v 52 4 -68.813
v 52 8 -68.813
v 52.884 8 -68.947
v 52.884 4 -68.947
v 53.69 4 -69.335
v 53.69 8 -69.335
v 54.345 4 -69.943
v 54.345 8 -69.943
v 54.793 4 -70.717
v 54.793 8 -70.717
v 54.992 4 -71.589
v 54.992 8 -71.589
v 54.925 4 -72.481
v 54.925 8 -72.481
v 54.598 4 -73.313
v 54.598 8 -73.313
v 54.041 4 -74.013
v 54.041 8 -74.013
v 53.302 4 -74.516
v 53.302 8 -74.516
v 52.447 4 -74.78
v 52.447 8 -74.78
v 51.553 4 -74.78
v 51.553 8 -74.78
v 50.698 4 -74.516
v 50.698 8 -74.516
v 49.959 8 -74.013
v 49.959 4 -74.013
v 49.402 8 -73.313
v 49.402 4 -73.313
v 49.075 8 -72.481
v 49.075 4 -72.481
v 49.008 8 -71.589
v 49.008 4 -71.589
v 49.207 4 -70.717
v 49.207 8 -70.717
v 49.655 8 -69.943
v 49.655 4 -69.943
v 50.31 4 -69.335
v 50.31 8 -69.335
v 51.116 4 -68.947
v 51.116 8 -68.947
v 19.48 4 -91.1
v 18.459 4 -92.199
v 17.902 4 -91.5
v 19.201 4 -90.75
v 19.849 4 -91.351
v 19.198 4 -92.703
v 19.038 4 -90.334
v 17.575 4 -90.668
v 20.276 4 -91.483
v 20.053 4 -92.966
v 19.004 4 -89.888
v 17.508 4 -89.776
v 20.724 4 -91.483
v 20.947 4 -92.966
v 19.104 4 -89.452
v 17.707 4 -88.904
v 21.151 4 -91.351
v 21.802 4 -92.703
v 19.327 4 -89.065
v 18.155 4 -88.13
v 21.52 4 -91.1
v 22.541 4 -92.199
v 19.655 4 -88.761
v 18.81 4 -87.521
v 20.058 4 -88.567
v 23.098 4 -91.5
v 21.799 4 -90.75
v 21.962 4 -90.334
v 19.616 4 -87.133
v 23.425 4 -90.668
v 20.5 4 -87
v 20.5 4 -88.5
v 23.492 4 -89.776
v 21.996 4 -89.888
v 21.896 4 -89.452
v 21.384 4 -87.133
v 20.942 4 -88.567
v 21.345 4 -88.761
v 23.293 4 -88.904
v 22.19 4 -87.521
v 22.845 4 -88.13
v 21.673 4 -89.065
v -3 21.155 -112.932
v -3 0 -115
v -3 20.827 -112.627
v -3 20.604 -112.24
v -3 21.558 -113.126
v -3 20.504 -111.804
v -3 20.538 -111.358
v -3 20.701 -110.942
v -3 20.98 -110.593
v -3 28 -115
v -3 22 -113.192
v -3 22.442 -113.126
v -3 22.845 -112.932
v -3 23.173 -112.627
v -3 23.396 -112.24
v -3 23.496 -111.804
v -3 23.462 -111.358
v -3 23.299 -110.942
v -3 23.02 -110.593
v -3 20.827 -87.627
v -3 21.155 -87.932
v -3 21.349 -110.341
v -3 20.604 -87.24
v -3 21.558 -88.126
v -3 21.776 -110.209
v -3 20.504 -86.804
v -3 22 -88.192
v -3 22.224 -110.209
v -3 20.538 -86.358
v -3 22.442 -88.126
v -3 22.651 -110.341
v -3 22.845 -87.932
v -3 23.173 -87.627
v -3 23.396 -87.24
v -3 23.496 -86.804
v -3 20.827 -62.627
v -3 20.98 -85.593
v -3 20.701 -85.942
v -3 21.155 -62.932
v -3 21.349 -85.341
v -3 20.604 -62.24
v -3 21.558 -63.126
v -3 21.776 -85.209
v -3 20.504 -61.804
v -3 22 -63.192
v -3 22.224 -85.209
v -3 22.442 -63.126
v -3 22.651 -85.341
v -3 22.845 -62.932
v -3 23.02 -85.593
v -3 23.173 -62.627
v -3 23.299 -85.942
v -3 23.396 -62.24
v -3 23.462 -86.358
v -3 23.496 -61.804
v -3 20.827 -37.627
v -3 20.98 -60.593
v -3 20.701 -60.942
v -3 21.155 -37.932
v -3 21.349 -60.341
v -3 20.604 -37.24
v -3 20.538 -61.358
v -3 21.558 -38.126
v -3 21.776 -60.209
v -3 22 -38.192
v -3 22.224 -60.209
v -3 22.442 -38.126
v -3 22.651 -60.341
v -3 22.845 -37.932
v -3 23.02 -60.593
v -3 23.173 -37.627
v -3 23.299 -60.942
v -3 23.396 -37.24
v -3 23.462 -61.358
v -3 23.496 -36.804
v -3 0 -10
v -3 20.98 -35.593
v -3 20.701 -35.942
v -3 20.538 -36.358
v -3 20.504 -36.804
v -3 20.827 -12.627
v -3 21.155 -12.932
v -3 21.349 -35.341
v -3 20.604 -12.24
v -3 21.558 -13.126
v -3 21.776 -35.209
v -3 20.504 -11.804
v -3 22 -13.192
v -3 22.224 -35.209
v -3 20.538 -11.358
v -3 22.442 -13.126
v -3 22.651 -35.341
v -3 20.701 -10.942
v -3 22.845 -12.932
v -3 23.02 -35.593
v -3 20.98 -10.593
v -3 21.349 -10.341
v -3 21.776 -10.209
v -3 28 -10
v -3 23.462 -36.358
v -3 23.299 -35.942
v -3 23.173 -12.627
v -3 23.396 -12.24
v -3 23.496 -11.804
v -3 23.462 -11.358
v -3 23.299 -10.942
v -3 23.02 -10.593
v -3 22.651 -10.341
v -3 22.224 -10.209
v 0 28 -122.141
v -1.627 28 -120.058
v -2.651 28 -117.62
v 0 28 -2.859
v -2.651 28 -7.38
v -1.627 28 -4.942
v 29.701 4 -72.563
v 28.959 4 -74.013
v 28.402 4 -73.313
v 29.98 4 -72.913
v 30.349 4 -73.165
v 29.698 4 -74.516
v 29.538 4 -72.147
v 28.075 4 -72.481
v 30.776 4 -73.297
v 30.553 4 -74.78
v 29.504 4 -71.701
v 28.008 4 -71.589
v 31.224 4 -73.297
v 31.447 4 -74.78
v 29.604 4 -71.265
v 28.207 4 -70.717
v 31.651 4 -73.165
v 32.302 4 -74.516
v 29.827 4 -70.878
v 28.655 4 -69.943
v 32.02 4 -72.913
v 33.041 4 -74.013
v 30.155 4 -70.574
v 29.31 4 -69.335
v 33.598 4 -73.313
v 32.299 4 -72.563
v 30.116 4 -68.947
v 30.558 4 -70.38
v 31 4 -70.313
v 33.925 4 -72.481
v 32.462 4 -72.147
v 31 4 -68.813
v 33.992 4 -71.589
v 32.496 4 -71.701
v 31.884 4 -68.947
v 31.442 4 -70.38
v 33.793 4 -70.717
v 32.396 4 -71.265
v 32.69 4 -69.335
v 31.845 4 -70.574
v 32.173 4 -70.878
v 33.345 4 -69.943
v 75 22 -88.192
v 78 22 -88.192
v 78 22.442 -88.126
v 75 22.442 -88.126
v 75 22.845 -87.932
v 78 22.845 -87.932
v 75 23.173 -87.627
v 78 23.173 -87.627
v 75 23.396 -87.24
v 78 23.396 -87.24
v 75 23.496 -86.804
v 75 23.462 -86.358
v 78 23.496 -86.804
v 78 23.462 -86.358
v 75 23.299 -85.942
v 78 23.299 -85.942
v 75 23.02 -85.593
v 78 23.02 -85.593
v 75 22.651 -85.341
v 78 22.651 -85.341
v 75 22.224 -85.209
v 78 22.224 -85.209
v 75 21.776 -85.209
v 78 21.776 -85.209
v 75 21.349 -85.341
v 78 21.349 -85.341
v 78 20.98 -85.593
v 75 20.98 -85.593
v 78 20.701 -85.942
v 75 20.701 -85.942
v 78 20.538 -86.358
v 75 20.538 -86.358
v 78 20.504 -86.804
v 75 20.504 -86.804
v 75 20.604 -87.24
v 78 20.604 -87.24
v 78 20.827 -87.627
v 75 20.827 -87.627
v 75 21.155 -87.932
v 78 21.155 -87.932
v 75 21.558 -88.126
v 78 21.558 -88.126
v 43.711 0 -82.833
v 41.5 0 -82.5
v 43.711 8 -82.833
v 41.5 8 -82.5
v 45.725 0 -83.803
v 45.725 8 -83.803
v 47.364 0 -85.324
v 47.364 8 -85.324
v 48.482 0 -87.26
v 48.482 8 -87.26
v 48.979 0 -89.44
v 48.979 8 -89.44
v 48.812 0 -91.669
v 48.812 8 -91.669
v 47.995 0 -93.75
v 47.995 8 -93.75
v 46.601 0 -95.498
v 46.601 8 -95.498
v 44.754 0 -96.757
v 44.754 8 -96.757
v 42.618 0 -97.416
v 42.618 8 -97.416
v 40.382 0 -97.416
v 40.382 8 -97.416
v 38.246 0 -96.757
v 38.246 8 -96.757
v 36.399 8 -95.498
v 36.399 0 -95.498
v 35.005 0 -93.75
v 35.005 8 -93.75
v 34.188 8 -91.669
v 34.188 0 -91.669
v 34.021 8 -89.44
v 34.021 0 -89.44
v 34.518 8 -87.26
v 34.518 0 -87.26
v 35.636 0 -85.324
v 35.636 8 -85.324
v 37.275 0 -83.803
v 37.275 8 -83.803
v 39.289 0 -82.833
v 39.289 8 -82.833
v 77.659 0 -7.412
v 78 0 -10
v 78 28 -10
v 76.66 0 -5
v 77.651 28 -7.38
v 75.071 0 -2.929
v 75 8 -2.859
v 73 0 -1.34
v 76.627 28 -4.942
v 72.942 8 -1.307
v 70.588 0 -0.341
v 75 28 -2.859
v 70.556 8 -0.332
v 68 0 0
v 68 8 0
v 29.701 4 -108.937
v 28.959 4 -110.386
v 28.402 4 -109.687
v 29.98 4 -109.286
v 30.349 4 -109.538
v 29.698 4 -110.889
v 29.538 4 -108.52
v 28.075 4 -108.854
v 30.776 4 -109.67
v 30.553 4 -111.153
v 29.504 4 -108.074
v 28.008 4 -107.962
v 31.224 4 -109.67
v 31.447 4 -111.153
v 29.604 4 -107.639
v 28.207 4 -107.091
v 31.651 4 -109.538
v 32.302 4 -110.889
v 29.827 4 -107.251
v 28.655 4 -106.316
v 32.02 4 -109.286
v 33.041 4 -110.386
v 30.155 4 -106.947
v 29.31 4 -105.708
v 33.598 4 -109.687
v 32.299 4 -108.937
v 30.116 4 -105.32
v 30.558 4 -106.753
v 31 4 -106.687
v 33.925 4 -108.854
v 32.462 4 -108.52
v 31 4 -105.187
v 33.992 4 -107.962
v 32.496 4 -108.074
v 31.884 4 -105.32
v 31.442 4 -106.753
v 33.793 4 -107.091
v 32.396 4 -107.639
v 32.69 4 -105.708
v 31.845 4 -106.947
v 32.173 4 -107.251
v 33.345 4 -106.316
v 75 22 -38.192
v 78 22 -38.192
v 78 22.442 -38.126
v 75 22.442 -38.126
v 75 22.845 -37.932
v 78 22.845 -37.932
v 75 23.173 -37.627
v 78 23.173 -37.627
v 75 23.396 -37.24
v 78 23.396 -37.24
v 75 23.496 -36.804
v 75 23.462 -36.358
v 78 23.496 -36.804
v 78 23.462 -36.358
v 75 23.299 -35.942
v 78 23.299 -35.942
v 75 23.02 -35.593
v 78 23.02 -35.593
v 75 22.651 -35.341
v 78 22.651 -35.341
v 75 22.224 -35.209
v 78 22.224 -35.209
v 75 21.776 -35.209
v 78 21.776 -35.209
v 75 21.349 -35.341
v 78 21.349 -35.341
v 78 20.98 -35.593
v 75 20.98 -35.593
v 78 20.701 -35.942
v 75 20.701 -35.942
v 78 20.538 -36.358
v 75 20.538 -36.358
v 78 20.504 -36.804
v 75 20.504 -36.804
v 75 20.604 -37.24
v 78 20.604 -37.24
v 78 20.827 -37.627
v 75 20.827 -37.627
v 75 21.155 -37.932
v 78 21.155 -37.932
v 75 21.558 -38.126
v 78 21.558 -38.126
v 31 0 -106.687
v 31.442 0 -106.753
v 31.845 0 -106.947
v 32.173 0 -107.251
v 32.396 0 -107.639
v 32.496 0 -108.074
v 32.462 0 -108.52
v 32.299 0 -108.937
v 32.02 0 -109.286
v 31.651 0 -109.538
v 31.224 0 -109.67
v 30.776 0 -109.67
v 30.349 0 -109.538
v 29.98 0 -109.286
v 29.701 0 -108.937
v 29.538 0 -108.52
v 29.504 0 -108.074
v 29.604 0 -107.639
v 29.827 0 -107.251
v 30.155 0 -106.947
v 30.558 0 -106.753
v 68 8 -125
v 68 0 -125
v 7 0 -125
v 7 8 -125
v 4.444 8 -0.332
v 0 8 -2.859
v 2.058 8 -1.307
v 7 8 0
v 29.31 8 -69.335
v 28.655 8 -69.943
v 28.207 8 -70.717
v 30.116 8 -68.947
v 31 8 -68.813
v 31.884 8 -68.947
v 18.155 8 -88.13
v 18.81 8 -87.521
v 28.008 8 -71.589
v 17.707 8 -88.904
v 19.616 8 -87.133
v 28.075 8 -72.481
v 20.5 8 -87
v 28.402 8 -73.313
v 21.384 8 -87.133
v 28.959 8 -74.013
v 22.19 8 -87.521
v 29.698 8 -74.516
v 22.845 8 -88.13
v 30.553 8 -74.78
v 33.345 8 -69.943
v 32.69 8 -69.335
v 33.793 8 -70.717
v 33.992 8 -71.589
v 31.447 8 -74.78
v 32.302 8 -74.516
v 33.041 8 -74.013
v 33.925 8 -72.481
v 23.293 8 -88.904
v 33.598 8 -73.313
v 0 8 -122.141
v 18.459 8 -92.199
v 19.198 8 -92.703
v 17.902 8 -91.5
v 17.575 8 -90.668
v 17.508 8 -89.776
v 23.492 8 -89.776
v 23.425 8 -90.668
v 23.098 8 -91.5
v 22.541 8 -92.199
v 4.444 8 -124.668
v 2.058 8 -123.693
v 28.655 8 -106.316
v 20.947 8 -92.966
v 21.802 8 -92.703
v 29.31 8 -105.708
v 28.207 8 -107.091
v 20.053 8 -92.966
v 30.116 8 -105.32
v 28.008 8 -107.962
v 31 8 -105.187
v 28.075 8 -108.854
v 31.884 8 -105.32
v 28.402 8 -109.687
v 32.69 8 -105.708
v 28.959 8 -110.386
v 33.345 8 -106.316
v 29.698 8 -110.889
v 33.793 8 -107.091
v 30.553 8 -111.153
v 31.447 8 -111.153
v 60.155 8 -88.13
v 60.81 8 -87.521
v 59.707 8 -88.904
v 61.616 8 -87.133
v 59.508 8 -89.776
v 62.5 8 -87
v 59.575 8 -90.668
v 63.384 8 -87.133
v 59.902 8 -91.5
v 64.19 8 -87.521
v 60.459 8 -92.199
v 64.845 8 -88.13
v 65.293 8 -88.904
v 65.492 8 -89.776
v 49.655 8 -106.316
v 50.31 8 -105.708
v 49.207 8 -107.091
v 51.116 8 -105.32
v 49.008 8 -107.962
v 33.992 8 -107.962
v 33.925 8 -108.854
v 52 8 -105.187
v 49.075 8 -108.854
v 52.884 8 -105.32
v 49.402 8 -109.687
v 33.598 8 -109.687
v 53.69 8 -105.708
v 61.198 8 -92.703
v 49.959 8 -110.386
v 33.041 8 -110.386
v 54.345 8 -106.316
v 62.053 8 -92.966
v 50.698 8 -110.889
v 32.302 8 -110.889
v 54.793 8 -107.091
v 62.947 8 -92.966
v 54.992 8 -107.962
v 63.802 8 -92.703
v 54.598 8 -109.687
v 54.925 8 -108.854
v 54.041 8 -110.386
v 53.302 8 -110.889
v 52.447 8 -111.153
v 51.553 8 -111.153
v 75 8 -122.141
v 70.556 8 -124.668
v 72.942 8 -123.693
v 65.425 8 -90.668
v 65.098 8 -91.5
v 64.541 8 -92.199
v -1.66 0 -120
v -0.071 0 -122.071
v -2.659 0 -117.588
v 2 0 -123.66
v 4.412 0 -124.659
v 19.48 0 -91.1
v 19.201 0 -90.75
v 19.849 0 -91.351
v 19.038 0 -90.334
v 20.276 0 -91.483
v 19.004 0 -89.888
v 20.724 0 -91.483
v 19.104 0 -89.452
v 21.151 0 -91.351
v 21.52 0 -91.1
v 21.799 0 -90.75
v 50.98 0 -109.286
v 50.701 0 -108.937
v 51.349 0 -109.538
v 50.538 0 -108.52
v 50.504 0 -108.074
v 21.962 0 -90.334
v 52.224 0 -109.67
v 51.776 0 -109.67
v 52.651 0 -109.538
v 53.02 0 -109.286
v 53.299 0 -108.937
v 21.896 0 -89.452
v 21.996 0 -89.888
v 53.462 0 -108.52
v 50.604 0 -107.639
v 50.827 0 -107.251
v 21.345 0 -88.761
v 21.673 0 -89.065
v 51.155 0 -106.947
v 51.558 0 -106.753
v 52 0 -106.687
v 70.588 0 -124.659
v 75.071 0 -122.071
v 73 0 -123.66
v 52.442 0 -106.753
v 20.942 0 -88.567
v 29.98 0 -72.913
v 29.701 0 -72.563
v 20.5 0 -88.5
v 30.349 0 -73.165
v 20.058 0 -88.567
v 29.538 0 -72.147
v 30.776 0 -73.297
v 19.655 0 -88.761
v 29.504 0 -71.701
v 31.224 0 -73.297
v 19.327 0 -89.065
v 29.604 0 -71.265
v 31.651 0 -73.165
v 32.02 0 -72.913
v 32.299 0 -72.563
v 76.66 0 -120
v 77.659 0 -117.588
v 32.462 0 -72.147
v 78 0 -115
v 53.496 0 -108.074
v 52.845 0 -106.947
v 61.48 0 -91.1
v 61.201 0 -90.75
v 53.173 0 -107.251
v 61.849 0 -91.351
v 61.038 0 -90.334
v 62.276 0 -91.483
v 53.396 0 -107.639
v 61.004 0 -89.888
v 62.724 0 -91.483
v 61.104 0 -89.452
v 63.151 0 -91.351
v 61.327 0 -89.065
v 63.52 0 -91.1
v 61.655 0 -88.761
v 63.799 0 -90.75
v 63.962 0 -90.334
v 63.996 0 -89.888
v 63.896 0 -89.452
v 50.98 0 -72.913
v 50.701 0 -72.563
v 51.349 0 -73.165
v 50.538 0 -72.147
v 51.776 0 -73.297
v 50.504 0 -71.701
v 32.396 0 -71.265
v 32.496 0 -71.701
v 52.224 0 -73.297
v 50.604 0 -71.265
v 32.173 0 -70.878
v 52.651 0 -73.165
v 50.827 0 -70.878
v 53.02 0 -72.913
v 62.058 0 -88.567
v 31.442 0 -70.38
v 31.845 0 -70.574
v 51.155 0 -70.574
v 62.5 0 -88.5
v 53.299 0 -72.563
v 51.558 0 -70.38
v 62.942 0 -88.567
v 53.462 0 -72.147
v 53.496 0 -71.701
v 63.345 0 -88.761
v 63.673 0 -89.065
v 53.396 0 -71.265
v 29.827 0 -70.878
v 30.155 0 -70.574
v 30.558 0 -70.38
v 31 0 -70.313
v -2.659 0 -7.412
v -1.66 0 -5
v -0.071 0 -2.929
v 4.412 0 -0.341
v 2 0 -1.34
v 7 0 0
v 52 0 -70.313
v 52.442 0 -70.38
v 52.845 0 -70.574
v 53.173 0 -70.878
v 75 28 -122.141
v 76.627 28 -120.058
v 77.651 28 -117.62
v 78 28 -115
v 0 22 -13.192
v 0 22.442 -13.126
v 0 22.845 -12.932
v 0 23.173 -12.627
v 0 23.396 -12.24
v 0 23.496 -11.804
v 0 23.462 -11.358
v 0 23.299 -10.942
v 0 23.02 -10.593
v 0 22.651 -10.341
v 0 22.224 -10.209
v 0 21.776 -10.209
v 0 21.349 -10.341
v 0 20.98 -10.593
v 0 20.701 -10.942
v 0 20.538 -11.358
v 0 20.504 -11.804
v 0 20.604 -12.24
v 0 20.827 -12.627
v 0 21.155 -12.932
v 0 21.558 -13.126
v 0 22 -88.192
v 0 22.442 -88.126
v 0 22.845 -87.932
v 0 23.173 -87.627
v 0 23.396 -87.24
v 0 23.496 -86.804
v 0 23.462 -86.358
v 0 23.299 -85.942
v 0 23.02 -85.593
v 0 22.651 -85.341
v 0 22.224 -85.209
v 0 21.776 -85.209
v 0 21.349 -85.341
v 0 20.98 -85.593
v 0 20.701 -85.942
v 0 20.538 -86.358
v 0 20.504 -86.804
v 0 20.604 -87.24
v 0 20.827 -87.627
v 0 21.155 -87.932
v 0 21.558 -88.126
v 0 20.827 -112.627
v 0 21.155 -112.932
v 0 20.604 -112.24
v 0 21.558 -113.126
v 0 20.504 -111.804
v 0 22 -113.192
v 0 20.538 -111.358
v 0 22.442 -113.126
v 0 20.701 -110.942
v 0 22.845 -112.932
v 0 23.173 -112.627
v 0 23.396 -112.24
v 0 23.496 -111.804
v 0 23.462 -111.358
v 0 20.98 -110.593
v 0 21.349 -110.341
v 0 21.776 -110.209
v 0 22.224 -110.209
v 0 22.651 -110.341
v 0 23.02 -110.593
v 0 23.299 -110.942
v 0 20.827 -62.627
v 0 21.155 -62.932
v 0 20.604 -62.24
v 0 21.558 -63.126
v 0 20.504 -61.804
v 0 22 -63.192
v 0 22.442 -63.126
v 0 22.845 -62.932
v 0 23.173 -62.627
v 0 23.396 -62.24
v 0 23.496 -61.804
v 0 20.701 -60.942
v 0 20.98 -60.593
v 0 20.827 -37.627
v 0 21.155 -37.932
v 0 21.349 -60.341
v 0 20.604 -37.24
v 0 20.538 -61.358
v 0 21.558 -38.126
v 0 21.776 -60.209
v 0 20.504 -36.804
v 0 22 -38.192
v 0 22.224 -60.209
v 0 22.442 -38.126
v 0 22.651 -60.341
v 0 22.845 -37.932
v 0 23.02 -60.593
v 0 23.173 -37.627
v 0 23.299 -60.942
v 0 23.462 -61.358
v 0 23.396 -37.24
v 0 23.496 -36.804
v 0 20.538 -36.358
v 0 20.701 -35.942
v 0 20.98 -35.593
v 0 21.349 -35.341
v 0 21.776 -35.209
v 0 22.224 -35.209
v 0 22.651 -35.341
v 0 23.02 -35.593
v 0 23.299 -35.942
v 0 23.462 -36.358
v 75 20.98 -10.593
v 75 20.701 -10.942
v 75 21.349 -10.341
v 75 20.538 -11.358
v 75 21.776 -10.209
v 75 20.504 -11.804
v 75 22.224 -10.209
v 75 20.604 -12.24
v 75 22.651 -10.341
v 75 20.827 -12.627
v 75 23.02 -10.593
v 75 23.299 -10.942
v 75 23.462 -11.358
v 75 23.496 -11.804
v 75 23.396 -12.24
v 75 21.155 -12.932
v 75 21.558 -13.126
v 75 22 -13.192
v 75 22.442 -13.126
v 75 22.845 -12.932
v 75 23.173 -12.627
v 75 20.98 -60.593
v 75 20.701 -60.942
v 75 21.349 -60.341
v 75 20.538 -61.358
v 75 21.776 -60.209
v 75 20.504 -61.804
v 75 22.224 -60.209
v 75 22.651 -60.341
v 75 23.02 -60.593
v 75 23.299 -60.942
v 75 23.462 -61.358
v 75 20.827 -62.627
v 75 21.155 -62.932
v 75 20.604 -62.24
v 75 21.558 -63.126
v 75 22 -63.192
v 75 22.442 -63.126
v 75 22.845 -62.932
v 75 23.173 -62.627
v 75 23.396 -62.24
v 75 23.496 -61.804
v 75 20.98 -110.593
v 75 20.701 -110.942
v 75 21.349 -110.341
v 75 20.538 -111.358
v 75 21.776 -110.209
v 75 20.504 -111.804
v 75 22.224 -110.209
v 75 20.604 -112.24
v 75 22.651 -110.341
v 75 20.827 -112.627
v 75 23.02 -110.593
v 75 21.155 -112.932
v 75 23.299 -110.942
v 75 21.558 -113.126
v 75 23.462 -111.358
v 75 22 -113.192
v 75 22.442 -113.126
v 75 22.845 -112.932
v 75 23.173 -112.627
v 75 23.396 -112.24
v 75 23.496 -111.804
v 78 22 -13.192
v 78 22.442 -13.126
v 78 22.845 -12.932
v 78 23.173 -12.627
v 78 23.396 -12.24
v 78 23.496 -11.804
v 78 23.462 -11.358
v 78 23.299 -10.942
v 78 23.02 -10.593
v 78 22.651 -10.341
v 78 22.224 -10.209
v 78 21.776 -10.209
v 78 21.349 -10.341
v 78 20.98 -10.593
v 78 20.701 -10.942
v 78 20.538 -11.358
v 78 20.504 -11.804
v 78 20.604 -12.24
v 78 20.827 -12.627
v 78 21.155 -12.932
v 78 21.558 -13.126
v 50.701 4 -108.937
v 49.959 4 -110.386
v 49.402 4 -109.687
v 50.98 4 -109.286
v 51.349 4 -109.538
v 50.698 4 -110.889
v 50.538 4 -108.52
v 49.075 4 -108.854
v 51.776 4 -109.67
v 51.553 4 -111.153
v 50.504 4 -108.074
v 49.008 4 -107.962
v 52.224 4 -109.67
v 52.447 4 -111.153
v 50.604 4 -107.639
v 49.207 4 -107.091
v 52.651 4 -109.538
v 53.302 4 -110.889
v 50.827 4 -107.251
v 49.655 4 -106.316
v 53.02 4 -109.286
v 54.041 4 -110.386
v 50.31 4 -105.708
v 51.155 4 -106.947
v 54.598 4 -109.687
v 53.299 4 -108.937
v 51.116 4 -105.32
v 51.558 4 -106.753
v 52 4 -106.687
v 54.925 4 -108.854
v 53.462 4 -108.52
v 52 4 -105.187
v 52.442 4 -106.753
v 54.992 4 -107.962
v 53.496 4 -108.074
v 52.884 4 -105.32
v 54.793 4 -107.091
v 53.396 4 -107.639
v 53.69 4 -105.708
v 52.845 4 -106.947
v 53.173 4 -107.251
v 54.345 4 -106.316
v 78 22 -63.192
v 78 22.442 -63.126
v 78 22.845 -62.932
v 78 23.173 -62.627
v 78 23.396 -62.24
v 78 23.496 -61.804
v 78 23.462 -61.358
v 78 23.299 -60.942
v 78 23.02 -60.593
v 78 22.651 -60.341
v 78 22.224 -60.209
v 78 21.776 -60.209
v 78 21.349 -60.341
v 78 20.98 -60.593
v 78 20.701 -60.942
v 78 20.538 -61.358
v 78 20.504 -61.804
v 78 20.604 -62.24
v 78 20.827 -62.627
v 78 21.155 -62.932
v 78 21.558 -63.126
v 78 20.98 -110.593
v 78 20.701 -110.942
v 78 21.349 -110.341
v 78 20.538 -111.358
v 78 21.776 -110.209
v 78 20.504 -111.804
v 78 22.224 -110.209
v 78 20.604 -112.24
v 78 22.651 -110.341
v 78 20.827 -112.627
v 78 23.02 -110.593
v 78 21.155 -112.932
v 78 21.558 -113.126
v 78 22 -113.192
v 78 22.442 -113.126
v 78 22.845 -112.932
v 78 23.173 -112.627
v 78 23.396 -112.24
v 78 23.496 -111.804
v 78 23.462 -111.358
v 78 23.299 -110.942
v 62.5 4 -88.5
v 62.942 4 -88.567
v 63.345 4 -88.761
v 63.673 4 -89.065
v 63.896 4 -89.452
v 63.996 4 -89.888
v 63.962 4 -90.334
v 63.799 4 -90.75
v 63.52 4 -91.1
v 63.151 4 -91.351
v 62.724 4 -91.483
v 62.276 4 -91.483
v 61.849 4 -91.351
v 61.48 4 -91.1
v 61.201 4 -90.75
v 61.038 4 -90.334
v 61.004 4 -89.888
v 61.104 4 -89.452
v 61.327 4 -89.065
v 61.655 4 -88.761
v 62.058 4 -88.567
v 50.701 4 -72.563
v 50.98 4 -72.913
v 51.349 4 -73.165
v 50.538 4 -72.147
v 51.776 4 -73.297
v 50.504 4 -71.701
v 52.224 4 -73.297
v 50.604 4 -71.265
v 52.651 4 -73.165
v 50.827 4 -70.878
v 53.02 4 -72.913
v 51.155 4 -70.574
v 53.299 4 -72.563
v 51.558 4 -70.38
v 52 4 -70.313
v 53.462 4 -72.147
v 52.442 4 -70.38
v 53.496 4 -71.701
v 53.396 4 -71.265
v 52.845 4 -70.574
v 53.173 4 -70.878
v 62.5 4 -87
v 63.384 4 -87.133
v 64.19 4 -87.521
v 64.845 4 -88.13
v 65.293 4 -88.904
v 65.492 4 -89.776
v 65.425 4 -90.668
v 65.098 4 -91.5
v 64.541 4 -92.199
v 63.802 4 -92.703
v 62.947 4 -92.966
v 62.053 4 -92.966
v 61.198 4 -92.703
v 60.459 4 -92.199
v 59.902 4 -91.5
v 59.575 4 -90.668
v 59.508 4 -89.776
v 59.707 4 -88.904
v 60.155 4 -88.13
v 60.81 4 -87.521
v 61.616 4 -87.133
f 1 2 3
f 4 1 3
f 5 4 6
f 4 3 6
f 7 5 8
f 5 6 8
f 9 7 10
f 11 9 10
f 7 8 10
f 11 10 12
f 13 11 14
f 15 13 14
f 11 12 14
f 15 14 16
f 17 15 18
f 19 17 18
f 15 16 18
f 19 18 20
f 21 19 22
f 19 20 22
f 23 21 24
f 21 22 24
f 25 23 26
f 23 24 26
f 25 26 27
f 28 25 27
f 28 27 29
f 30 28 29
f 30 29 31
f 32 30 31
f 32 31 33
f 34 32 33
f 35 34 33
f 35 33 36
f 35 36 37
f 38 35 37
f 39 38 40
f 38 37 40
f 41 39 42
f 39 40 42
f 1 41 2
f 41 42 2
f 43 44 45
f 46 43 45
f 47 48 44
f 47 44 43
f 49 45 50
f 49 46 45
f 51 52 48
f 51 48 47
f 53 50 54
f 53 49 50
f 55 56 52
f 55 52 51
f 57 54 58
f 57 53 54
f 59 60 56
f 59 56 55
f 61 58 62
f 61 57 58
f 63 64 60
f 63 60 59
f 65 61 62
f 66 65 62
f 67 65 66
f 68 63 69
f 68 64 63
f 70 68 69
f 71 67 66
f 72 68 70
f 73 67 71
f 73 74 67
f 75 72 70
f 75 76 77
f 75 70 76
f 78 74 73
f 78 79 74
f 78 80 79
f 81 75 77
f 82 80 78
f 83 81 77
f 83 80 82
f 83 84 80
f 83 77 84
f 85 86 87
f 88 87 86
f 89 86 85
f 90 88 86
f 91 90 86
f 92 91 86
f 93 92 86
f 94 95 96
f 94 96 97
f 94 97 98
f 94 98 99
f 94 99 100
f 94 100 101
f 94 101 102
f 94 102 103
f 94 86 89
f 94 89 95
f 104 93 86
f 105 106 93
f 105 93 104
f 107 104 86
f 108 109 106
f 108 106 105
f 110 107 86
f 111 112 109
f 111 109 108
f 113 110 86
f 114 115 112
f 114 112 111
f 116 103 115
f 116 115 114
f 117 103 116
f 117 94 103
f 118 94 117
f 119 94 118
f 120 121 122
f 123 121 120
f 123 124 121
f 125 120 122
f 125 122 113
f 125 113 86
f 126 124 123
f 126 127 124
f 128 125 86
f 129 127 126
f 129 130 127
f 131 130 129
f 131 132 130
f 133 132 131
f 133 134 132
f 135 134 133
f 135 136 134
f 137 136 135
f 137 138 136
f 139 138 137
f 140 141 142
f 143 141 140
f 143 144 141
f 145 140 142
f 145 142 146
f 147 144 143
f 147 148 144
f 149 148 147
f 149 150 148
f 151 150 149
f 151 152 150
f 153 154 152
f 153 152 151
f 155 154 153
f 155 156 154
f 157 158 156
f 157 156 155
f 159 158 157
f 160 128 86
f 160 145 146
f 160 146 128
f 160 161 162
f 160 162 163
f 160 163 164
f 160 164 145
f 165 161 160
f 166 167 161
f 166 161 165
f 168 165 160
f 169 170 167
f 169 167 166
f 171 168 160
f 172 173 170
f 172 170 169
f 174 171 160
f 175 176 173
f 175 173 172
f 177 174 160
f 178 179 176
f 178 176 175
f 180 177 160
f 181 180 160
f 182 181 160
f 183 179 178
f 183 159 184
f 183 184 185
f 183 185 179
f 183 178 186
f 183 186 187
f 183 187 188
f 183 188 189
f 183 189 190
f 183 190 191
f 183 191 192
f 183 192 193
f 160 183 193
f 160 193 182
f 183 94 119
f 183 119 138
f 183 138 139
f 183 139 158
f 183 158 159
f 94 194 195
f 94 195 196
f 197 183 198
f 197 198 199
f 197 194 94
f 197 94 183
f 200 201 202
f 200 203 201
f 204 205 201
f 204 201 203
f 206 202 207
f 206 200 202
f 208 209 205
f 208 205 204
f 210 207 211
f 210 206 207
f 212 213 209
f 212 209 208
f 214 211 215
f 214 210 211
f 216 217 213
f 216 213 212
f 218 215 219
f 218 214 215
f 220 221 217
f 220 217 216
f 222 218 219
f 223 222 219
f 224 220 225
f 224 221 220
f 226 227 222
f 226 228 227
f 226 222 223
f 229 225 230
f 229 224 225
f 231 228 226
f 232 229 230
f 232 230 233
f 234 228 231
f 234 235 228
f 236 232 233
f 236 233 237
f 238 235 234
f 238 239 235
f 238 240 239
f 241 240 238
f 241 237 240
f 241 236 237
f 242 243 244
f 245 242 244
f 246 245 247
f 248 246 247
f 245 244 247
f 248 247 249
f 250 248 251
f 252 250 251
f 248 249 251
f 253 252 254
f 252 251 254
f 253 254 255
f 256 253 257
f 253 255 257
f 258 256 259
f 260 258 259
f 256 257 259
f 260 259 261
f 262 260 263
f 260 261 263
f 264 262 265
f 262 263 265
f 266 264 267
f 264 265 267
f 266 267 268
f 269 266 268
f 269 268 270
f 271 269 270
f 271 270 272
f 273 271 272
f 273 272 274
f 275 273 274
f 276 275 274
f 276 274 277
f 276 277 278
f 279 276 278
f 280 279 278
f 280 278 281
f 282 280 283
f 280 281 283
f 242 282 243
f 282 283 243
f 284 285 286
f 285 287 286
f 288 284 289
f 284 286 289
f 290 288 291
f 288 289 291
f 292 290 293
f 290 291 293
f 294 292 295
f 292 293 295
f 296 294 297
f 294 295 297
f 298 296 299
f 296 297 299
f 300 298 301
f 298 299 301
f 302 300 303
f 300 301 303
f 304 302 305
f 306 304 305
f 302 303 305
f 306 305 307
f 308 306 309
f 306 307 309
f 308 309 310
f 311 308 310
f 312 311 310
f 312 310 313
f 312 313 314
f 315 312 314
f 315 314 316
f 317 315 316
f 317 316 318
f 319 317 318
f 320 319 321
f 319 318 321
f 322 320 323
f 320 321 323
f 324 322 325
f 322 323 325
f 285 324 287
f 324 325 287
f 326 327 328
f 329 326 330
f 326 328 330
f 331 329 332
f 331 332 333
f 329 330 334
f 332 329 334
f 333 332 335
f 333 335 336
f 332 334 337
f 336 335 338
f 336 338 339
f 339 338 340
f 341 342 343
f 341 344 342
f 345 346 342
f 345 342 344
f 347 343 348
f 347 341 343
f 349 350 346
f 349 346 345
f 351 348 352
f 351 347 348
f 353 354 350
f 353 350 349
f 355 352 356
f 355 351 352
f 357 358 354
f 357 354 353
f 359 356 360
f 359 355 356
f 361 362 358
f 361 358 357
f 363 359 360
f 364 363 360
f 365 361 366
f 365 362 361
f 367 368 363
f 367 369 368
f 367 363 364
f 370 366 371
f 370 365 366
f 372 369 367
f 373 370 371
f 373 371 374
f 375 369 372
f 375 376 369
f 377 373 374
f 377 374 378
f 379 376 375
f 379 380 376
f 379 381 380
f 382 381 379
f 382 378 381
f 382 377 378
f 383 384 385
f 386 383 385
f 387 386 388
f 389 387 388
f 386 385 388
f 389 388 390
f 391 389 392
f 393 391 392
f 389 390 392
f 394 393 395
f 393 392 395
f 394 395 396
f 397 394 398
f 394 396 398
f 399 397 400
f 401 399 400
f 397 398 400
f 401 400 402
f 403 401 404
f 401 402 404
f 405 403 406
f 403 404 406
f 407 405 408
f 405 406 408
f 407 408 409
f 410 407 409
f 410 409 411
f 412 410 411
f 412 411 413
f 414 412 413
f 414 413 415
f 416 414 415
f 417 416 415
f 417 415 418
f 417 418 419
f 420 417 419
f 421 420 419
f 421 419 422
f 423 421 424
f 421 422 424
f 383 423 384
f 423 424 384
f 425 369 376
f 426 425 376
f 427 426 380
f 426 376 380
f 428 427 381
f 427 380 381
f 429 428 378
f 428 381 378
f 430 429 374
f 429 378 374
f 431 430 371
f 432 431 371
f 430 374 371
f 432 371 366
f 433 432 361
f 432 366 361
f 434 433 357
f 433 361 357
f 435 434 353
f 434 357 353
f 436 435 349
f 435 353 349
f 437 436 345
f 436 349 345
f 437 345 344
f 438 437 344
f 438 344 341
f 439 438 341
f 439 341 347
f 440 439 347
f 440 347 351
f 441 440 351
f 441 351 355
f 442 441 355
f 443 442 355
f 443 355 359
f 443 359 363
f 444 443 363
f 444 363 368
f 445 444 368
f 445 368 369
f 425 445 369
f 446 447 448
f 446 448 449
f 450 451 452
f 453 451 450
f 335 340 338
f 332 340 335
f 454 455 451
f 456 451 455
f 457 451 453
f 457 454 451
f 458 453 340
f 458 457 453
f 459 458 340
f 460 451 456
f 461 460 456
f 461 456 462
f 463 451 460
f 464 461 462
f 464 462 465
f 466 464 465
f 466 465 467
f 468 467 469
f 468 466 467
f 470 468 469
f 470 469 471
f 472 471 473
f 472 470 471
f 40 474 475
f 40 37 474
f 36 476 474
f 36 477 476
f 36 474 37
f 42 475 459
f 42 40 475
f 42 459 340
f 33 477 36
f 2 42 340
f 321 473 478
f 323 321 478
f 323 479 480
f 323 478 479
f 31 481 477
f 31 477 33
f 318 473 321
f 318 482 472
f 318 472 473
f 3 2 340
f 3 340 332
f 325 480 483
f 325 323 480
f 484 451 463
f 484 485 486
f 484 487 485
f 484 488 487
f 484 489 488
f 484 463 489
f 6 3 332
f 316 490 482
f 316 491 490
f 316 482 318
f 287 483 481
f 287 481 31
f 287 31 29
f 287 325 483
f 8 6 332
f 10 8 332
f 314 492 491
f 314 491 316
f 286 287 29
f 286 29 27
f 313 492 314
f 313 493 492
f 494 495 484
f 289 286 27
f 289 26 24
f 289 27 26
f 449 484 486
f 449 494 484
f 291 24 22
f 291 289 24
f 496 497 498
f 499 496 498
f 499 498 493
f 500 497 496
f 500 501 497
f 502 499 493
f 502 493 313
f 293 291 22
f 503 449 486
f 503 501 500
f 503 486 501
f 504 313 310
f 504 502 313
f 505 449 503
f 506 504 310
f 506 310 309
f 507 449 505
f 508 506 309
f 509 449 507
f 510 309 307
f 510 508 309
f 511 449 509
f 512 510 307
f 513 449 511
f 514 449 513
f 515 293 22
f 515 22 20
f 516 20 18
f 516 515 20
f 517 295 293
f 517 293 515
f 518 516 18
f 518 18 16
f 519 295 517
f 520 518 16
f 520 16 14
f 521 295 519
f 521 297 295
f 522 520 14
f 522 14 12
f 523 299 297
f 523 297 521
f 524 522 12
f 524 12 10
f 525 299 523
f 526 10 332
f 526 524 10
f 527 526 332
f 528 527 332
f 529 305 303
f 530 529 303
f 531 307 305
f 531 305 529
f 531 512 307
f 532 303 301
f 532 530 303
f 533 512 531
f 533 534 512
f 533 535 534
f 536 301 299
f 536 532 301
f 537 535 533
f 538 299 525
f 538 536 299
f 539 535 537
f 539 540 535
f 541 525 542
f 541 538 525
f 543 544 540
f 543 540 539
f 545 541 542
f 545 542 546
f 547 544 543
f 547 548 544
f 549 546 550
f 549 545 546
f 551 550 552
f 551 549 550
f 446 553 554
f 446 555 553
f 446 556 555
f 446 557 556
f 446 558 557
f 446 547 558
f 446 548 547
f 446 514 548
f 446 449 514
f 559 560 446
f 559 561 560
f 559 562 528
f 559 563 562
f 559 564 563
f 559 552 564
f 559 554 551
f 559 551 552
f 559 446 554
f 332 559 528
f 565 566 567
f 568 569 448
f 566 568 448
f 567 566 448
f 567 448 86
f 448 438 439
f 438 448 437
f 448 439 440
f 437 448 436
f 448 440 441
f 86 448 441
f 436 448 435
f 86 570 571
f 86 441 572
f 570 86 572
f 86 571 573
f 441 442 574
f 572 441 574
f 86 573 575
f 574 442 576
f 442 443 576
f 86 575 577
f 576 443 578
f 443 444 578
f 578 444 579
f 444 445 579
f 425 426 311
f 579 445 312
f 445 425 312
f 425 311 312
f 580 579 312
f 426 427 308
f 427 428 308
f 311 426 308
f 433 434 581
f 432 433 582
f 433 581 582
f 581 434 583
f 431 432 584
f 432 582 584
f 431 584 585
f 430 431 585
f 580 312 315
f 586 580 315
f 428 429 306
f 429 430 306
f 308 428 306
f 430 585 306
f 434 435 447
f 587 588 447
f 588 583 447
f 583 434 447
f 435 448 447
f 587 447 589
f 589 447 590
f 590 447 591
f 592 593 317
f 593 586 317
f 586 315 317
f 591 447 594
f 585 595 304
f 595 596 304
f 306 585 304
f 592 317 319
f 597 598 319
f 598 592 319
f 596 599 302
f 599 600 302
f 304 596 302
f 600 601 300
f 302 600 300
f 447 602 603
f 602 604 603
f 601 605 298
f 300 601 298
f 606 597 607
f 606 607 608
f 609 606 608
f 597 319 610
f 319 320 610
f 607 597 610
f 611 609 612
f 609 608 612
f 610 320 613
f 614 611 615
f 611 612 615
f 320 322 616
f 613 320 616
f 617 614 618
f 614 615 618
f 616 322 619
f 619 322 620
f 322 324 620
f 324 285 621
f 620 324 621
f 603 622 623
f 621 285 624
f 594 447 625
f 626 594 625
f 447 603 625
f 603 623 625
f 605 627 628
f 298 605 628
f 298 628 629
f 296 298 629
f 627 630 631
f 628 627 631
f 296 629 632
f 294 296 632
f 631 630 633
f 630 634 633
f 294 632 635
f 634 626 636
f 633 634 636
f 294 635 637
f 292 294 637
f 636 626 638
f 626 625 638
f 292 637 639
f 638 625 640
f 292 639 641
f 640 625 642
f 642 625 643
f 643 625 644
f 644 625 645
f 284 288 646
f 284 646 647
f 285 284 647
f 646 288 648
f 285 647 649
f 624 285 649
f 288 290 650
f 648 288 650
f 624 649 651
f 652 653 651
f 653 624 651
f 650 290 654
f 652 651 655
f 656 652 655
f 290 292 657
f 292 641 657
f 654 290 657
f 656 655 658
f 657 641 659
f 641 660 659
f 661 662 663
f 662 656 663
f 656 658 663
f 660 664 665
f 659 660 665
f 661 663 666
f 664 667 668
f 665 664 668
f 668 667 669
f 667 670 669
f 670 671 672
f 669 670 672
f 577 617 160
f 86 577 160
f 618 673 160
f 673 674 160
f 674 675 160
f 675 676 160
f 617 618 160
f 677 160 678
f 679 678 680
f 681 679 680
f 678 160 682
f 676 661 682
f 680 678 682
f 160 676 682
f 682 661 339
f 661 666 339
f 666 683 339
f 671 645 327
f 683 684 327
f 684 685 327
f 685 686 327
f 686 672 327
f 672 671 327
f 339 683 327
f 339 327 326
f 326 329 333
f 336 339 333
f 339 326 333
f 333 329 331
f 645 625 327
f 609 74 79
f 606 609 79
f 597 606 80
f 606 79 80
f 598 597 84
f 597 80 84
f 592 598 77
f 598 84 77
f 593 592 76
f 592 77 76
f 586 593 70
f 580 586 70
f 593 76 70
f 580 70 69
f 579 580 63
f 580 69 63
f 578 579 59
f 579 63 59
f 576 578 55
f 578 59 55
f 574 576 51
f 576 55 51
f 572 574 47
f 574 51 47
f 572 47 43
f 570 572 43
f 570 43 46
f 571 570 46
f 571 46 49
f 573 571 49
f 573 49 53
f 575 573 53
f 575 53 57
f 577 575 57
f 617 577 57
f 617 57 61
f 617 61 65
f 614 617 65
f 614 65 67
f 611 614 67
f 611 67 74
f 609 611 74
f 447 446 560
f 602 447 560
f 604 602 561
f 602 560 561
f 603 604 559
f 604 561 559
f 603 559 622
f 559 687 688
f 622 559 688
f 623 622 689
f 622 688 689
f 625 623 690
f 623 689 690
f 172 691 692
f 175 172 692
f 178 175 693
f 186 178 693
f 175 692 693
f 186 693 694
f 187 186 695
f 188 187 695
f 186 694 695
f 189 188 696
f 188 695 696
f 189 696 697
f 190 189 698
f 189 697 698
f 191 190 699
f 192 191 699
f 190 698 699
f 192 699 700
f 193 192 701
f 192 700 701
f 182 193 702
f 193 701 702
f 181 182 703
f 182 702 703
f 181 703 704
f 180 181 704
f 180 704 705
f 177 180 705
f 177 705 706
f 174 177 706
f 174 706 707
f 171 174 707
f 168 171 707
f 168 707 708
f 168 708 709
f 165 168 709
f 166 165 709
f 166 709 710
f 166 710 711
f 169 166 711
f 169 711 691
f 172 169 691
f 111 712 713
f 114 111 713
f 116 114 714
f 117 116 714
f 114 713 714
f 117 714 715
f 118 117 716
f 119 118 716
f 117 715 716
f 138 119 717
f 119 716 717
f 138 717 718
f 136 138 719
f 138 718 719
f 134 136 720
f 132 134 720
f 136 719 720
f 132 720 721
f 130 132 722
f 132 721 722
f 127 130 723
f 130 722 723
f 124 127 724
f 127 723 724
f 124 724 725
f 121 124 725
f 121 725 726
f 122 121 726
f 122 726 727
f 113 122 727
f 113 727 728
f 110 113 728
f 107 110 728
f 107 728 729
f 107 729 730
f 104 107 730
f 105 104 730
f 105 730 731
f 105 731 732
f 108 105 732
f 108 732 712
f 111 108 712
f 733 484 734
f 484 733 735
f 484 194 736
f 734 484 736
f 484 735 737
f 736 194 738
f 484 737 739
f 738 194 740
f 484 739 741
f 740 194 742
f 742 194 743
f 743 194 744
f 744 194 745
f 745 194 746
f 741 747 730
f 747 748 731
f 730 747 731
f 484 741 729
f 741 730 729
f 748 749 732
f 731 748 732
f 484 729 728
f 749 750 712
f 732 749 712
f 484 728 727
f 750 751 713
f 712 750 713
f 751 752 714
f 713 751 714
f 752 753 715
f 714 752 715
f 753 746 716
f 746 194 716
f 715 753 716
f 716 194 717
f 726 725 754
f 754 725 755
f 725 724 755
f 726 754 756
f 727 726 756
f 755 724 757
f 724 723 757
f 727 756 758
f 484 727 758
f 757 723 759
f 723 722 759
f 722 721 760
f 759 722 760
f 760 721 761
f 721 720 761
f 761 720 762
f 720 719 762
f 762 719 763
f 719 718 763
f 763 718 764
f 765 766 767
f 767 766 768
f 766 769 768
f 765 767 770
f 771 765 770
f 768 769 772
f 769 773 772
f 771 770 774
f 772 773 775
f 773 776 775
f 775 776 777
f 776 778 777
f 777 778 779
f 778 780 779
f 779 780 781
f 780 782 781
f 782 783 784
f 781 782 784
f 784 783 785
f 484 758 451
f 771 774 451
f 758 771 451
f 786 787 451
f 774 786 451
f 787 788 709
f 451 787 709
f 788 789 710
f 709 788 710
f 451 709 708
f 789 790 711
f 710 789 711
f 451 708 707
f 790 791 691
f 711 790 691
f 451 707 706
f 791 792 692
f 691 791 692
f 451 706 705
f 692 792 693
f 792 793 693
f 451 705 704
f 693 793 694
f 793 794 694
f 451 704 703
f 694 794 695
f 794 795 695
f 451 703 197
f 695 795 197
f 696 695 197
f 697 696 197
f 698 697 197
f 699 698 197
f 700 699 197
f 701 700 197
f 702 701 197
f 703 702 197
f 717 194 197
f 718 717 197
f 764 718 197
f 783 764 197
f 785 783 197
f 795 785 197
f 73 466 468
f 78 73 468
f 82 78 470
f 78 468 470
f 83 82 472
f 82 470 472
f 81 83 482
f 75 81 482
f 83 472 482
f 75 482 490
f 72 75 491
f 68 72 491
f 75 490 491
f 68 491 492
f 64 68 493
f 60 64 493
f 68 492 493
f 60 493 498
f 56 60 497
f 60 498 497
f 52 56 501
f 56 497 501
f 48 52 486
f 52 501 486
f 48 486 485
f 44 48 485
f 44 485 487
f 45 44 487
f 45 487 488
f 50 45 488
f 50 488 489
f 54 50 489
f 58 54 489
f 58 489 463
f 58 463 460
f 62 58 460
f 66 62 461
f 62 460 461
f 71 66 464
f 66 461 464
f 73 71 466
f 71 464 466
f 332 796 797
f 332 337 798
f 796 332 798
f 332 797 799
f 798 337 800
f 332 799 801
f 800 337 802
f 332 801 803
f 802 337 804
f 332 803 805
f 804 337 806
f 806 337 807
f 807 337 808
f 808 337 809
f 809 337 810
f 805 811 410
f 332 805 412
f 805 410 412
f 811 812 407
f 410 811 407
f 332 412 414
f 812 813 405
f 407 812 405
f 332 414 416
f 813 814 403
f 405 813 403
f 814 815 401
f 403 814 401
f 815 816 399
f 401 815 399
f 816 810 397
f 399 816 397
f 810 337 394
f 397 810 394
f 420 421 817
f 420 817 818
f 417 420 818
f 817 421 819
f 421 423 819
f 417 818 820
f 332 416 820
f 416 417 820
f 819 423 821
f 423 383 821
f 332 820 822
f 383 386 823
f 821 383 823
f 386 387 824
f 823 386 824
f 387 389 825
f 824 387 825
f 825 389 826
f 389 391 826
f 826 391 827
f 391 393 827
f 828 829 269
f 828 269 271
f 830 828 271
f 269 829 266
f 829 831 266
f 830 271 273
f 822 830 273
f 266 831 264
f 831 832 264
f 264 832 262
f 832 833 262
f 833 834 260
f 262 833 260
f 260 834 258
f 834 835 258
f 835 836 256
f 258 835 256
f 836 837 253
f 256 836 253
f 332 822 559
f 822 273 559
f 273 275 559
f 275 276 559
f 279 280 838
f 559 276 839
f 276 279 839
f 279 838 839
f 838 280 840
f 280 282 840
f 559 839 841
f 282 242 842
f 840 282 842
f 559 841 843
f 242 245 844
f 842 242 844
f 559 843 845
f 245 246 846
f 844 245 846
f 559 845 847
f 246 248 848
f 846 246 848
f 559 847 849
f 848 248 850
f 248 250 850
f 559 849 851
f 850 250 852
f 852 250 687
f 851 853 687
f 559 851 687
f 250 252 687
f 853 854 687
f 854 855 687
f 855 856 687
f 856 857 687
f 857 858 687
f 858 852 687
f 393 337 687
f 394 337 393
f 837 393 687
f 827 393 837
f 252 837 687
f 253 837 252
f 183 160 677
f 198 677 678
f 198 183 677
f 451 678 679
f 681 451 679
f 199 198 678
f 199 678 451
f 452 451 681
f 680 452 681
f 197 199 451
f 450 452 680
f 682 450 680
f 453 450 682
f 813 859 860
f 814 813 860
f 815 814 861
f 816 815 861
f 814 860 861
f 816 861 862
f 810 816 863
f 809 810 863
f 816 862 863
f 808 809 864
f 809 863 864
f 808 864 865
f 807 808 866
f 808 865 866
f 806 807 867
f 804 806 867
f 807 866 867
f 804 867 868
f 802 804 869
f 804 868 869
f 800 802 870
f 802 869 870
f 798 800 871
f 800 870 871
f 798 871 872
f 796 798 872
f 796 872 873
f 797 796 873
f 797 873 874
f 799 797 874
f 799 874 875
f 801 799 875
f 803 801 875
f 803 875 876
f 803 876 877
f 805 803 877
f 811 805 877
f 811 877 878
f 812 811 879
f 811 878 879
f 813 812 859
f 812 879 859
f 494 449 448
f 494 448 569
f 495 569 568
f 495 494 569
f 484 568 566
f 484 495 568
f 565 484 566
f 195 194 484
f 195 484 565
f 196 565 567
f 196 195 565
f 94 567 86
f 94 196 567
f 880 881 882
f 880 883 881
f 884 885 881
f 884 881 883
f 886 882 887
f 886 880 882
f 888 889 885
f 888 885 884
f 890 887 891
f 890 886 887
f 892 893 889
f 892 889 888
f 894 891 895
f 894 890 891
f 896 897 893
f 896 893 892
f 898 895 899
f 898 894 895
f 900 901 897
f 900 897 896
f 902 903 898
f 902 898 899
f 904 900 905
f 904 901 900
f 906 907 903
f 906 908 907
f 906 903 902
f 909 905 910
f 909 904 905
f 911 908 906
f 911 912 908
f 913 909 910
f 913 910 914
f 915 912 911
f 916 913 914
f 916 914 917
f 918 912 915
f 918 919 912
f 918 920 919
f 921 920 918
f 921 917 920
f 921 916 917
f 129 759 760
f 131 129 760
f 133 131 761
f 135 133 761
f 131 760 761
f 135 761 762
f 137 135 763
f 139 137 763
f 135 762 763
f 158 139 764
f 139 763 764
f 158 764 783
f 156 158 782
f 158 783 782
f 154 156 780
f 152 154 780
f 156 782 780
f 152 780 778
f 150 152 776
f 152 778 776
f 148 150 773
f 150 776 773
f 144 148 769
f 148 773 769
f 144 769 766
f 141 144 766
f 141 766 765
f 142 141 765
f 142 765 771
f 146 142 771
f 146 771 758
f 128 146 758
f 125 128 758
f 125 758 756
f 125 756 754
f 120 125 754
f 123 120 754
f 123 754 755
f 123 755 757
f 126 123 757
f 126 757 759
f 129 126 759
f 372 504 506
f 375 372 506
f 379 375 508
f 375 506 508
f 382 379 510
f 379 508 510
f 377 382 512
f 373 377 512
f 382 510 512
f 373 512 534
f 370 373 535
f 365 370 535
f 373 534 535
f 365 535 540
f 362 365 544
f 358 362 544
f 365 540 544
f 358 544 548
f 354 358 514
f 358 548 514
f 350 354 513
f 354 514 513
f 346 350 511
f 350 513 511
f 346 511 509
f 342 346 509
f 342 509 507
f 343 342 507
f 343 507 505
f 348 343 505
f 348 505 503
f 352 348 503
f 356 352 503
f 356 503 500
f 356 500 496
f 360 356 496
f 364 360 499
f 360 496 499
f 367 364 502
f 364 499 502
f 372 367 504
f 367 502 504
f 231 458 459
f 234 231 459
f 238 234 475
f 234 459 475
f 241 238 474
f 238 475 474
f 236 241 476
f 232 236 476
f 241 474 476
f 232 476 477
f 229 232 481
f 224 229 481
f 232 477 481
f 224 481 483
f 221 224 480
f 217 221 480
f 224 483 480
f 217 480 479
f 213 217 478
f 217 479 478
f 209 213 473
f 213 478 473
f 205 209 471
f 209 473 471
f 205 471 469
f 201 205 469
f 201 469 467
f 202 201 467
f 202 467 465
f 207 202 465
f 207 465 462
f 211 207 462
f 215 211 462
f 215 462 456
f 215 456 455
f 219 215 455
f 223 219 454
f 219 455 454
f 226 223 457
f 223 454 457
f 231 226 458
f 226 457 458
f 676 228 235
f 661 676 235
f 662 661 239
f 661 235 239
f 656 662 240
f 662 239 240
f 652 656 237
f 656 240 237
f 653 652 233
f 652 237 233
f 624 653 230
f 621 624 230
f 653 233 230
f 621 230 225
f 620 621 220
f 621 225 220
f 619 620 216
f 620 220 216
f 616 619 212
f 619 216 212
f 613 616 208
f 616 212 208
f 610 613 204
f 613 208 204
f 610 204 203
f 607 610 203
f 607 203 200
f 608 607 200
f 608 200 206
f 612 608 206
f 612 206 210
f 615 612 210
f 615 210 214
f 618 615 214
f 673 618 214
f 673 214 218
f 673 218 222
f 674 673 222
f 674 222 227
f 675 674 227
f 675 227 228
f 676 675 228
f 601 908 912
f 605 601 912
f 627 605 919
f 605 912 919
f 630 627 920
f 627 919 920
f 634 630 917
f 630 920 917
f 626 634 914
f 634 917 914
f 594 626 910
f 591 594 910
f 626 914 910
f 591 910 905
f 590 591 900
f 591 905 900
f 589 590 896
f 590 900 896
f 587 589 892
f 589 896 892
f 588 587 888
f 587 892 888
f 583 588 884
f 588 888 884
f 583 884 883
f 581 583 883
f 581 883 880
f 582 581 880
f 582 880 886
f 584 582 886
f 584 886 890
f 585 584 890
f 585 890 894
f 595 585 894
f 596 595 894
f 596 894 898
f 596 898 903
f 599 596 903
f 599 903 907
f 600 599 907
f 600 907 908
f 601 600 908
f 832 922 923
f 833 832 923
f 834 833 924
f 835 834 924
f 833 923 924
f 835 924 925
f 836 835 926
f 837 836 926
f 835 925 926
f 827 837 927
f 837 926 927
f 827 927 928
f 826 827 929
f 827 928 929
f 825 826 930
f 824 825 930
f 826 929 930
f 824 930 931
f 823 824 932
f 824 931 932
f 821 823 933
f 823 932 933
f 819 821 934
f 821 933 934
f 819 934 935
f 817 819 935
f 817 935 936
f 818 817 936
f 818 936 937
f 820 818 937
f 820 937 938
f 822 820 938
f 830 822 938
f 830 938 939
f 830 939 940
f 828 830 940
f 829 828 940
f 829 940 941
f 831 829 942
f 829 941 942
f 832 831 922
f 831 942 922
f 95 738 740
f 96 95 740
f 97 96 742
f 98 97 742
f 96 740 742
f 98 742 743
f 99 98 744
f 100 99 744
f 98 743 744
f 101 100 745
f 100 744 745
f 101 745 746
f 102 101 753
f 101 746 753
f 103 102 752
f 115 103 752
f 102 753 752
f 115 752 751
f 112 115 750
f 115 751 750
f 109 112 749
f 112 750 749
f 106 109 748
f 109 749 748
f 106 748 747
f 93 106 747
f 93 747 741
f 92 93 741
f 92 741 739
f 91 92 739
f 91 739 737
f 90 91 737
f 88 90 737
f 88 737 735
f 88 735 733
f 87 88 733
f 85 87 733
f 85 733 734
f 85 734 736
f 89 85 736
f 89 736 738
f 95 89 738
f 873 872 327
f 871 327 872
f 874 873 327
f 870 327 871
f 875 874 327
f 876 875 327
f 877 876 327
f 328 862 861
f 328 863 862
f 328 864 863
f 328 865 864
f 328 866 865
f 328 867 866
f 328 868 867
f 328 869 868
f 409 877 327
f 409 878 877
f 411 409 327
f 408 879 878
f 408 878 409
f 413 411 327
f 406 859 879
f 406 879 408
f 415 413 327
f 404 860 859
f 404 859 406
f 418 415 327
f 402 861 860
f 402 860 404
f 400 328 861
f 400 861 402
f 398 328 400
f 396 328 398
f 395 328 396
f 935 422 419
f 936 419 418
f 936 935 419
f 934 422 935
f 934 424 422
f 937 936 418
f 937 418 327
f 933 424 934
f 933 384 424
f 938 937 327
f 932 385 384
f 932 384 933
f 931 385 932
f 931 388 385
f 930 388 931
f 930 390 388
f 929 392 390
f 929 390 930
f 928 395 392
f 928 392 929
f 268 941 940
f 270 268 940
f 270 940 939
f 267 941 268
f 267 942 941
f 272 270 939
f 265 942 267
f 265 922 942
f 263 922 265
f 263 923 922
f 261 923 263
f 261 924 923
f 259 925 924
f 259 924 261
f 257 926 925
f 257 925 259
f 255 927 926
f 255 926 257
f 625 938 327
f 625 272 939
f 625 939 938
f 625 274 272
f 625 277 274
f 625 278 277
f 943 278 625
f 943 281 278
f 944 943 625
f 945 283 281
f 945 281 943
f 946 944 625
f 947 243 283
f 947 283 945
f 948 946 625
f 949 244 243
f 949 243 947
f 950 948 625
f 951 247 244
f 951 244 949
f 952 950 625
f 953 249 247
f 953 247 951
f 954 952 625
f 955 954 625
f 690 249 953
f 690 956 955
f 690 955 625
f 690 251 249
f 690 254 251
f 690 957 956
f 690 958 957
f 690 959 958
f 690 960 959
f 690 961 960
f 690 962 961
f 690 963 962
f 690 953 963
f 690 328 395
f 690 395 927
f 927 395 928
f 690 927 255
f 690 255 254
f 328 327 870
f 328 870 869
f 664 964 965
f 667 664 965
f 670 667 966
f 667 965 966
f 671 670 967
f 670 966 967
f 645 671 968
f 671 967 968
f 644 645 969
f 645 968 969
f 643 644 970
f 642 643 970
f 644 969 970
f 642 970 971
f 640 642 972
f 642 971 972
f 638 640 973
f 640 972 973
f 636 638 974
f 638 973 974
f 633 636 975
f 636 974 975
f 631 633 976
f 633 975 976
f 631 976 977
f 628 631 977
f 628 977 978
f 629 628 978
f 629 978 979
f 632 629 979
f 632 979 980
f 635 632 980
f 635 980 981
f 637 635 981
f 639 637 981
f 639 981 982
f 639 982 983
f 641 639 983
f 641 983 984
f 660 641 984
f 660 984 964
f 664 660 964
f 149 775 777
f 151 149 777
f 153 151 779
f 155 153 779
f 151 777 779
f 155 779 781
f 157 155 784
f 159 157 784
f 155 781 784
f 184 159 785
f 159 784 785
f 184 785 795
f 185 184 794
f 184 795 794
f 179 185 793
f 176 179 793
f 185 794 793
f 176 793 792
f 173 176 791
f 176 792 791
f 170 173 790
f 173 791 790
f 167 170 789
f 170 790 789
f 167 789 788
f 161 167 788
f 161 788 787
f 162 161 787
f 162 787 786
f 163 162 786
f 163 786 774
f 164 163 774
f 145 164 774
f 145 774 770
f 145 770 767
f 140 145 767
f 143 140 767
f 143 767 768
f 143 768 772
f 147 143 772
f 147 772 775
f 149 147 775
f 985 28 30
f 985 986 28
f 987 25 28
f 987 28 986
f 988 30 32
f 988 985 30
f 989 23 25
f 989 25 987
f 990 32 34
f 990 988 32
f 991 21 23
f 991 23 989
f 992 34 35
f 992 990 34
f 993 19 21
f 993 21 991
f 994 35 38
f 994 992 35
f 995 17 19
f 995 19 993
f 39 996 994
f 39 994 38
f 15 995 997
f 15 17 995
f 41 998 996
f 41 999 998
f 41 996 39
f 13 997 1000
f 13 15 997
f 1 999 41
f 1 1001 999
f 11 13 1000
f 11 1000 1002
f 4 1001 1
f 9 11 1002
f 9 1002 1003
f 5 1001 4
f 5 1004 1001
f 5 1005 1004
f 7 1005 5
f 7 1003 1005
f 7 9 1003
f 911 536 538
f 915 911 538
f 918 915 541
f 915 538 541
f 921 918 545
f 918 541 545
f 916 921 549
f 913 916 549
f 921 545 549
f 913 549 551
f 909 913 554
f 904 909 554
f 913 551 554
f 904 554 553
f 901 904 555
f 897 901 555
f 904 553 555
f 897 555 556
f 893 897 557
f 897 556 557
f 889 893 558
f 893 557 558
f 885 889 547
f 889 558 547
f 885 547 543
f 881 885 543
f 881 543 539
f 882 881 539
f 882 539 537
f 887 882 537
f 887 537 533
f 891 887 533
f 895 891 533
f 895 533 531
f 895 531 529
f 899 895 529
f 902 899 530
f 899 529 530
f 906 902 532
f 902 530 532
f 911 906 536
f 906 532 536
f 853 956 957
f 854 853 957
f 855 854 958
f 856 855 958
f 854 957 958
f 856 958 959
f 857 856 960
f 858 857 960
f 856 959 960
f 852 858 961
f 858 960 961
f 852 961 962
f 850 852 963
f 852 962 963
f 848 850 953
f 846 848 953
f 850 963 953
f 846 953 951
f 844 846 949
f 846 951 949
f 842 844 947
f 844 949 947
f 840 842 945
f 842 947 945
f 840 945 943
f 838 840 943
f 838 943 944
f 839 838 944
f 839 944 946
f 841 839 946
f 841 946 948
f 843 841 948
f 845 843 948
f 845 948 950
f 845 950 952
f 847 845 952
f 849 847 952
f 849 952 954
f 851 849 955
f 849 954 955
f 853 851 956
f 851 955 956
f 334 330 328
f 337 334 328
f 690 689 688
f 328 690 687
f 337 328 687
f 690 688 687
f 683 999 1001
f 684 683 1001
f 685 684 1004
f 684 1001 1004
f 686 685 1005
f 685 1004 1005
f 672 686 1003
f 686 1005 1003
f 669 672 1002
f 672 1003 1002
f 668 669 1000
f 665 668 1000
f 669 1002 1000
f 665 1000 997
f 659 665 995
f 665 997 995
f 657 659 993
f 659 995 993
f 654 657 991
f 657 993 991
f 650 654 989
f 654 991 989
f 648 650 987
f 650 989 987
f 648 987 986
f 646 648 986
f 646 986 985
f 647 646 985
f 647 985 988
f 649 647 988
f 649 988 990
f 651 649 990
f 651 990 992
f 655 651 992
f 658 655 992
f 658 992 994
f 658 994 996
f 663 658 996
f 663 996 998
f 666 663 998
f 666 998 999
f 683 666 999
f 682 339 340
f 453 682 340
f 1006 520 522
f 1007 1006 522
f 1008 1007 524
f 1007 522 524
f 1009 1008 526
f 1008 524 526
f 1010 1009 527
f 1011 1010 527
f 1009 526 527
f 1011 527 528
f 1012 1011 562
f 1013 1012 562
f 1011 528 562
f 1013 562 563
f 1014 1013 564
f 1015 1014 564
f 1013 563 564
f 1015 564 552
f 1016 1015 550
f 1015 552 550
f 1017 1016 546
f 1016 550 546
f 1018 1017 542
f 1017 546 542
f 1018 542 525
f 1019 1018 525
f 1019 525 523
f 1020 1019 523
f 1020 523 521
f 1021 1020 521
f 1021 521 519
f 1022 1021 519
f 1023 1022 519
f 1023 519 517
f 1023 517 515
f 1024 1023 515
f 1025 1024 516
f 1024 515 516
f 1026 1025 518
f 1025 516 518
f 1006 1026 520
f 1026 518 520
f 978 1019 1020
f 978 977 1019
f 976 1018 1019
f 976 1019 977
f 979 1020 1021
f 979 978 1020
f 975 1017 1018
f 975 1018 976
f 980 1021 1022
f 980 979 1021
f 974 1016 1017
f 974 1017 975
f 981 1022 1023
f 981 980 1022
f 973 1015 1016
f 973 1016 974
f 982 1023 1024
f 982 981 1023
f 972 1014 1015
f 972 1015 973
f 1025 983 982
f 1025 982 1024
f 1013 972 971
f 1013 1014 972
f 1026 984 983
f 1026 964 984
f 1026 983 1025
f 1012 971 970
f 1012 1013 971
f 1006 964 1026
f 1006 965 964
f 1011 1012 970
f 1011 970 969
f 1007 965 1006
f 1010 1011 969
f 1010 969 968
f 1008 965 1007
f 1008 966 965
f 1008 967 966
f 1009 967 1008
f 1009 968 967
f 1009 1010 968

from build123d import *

# Parameters (mm, degrees)
SKETCH1_W           = 78
SKETCH1_H           = 125
BOSS_EXTRUDE1_DEPTH = 8
SKETCH2_R           = 7.5
SKETCH2_R_2         = 3
CUT_EXTRUDE1_DEPTH  = 4
SKETCH3_R           = 7.5
CUT_EXTRUDE2_DEPTH  = 148.39402973
SKETCH4_W           = 125
SKETCH4_H           = 20
SKETCH4_R           = 1.5
BOSS_EXTRUDE2_DEPTH = 3
SKETCH5_R           = 1.5
CUT_EXTRUDE3_DEPTH  = 149.690954668
SKETCH8_W           = 125
SKETCH8_H           = 28
BOSS_EXTRUDE3_DEPTH = 3
SKETCH9_R           = 1.5
CUT_EXTRUDE5_DEPTH  = 150.976664852
FILLET2_R           = 10


with BuildPart() as part:
    # Sketch1 → Boss-Extrude1 (new body)
    with BuildSketch(Plane(origin=(0, 0, 0), x_dir=(1, 0, 0), z_dir=(0, 1, 0))):
        with Locations((39, 62.5)):
            Rectangle(SKETCH1_W, SKETCH1_H)
    extrude(amount=BOSS_EXTRUDE1_DEPTH)

    # Sketch2 → Cut-Extrude1 (cut)
    with BuildSketch(Plane(origin=(0, 8, 0), x_dir=(-1, 0, 0), z_dir=(0, 1, 0))):
        with Locations(Location((-41.5, -90, 0), (0, 0, 90))):
            Circle(SKETCH2_R)
        with Locations(Location((-62.5, -90, 0), (0, 0, 90))):
            Circle(SKETCH2_R_2)
        with Locations(Location((-52, -71.813466521, 0), (0, 0, 90))):
            Circle(SKETCH2_R_2)
        with Locations(Location((-31, -71.813466521, 0), (0, 0, 90))):
            Circle(SKETCH2_R_2)
        with Locations(Location((-20.5, -90, 0), (0, 0, 90))):
            Circle(SKETCH2_R_2)
        with Locations(Location((-31, -108.186533479, 0), (0, 0, 90))):
            Circle(SKETCH2_R_2)
        with Locations(Location((-52, -108.186533479, 0), (0, 0, 90))):
            Circle(SKETCH2_R_2)
    extrude(amount=-CUT_EXTRUDE1_DEPTH, mode=Mode.SUBTRACT)

    # Sketch3 → Cut-Extrude2 (cut, through all)
    with BuildSketch(Plane(origin=(0, 4, 0), x_dir=(1, 0, 0), z_dir=(0, 1, 0))):
        with Locations(Location((41.5, 90, 0), (0, 0, 270))):
            Circle(SKETCH3_R)
    extrude(amount=-CUT_EXTRUDE2_DEPTH, mode=Mode.SUBTRACT)

    # Sketch4 → Boss-Extrude2 (add)
    with BuildSketch(Plane(origin=(78, 0, 0), x_dir=(0, 0, -1), z_dir=(1, 0, 0))):
        with Locations((62.5, 18)):
            Rectangle(SKETCH4_W, SKETCH4_H)
        with Locations((11.692170277, 22)):
            Circle(SKETCH4_R, mode=Mode.SUBTRACT)
        with Locations((36.692170277, 22)):
            Circle(SKETCH4_R, mode=Mode.SUBTRACT)
        with Locations((61.692170277, 22)):
            Circle(SKETCH4_R, mode=Mode.SUBTRACT)
        with Locations((86.692170277, 22)):
            Circle(SKETCH4_R, mode=Mode.SUBTRACT)
        with Locations((111.692170277, 22)):
            Circle(SKETCH4_R, mode=Mode.SUBTRACT)
    extrude(amount=-BOSS_EXTRUDE2_DEPTH)

    # Sketch5 → Cut-Extrude3 (cut, through all)
    with BuildSketch(Plane(origin=(0, 8, 0), x_dir=(-1, 0, 0), z_dir=(0, 1, 0))):
        with Locations(Location((-62.5, -90, 0), (0, 0, 90))):
            Circle(SKETCH5_R)
        with Locations(Location((-52, -71.813466521, 0), (0, 0, 90))):
            Circle(SKETCH5_R)
        with Locations(Location((-31, -71.813466521, 0), (0, 0, 90))):
            Circle(SKETCH5_R)
        with Locations(Location((-20.5, -90, 0), (0, 0, 90))):
            Circle(SKETCH5_R)
        with Locations(Location((-31, -108.186533479, 0), (0, 0, 90))):
            Circle(SKETCH5_R)
        with Locations(Location((-52, -108.186533479, 0), (0, 0, 90))):
            Circle(SKETCH5_R)
    extrude(amount=-CUT_EXTRUDE3_DEPTH, mode=Mode.SUBTRACT)

    # Sketch8 → Boss-Extrude3 (add)
    with BuildSketch(Plane.ZY):
        with Locations((-62.5, 14)):
            Rectangle(SKETCH8_W, SKETCH8_H)
    extrude(amount=BOSS_EXTRUDE3_DEPTH)

    # Sketch9 → Cut-Extrude5 (cut, through all)
    with BuildSketch(Plane(origin=(0, 0, 0), x_dir=(0, 0, -1), z_dir=(1, 0, 0))):
        with Locations((11.692170277, 22)):
            Circle(SKETCH9_R)
        with Locations((36.692170277, 22)):
            Circle(SKETCH9_R)
        with Locations((61.692170277, 22)):
            Circle(SKETCH9_R)
        with Locations((86.692170277, 22)):
            Circle(SKETCH9_R)
        with Locations((111.692170277, 22)):
            Circle(SKETCH9_R)
    extrude(amount=-CUT_EXTRUDE5_DEPTH, mode=Mode.SUBTRACT)

    # Fillet2
    fillet2_edges = [part.edges().sort_by_distance(p)[0] for p in [
        (-3, 14, -125),
        (78, 14, -125),
        (78, 14, 0),
        (-3, 14, 0),
    ]]
    fillet(fillet2_edges, radius=FILLET2_R)


solid = part.part
